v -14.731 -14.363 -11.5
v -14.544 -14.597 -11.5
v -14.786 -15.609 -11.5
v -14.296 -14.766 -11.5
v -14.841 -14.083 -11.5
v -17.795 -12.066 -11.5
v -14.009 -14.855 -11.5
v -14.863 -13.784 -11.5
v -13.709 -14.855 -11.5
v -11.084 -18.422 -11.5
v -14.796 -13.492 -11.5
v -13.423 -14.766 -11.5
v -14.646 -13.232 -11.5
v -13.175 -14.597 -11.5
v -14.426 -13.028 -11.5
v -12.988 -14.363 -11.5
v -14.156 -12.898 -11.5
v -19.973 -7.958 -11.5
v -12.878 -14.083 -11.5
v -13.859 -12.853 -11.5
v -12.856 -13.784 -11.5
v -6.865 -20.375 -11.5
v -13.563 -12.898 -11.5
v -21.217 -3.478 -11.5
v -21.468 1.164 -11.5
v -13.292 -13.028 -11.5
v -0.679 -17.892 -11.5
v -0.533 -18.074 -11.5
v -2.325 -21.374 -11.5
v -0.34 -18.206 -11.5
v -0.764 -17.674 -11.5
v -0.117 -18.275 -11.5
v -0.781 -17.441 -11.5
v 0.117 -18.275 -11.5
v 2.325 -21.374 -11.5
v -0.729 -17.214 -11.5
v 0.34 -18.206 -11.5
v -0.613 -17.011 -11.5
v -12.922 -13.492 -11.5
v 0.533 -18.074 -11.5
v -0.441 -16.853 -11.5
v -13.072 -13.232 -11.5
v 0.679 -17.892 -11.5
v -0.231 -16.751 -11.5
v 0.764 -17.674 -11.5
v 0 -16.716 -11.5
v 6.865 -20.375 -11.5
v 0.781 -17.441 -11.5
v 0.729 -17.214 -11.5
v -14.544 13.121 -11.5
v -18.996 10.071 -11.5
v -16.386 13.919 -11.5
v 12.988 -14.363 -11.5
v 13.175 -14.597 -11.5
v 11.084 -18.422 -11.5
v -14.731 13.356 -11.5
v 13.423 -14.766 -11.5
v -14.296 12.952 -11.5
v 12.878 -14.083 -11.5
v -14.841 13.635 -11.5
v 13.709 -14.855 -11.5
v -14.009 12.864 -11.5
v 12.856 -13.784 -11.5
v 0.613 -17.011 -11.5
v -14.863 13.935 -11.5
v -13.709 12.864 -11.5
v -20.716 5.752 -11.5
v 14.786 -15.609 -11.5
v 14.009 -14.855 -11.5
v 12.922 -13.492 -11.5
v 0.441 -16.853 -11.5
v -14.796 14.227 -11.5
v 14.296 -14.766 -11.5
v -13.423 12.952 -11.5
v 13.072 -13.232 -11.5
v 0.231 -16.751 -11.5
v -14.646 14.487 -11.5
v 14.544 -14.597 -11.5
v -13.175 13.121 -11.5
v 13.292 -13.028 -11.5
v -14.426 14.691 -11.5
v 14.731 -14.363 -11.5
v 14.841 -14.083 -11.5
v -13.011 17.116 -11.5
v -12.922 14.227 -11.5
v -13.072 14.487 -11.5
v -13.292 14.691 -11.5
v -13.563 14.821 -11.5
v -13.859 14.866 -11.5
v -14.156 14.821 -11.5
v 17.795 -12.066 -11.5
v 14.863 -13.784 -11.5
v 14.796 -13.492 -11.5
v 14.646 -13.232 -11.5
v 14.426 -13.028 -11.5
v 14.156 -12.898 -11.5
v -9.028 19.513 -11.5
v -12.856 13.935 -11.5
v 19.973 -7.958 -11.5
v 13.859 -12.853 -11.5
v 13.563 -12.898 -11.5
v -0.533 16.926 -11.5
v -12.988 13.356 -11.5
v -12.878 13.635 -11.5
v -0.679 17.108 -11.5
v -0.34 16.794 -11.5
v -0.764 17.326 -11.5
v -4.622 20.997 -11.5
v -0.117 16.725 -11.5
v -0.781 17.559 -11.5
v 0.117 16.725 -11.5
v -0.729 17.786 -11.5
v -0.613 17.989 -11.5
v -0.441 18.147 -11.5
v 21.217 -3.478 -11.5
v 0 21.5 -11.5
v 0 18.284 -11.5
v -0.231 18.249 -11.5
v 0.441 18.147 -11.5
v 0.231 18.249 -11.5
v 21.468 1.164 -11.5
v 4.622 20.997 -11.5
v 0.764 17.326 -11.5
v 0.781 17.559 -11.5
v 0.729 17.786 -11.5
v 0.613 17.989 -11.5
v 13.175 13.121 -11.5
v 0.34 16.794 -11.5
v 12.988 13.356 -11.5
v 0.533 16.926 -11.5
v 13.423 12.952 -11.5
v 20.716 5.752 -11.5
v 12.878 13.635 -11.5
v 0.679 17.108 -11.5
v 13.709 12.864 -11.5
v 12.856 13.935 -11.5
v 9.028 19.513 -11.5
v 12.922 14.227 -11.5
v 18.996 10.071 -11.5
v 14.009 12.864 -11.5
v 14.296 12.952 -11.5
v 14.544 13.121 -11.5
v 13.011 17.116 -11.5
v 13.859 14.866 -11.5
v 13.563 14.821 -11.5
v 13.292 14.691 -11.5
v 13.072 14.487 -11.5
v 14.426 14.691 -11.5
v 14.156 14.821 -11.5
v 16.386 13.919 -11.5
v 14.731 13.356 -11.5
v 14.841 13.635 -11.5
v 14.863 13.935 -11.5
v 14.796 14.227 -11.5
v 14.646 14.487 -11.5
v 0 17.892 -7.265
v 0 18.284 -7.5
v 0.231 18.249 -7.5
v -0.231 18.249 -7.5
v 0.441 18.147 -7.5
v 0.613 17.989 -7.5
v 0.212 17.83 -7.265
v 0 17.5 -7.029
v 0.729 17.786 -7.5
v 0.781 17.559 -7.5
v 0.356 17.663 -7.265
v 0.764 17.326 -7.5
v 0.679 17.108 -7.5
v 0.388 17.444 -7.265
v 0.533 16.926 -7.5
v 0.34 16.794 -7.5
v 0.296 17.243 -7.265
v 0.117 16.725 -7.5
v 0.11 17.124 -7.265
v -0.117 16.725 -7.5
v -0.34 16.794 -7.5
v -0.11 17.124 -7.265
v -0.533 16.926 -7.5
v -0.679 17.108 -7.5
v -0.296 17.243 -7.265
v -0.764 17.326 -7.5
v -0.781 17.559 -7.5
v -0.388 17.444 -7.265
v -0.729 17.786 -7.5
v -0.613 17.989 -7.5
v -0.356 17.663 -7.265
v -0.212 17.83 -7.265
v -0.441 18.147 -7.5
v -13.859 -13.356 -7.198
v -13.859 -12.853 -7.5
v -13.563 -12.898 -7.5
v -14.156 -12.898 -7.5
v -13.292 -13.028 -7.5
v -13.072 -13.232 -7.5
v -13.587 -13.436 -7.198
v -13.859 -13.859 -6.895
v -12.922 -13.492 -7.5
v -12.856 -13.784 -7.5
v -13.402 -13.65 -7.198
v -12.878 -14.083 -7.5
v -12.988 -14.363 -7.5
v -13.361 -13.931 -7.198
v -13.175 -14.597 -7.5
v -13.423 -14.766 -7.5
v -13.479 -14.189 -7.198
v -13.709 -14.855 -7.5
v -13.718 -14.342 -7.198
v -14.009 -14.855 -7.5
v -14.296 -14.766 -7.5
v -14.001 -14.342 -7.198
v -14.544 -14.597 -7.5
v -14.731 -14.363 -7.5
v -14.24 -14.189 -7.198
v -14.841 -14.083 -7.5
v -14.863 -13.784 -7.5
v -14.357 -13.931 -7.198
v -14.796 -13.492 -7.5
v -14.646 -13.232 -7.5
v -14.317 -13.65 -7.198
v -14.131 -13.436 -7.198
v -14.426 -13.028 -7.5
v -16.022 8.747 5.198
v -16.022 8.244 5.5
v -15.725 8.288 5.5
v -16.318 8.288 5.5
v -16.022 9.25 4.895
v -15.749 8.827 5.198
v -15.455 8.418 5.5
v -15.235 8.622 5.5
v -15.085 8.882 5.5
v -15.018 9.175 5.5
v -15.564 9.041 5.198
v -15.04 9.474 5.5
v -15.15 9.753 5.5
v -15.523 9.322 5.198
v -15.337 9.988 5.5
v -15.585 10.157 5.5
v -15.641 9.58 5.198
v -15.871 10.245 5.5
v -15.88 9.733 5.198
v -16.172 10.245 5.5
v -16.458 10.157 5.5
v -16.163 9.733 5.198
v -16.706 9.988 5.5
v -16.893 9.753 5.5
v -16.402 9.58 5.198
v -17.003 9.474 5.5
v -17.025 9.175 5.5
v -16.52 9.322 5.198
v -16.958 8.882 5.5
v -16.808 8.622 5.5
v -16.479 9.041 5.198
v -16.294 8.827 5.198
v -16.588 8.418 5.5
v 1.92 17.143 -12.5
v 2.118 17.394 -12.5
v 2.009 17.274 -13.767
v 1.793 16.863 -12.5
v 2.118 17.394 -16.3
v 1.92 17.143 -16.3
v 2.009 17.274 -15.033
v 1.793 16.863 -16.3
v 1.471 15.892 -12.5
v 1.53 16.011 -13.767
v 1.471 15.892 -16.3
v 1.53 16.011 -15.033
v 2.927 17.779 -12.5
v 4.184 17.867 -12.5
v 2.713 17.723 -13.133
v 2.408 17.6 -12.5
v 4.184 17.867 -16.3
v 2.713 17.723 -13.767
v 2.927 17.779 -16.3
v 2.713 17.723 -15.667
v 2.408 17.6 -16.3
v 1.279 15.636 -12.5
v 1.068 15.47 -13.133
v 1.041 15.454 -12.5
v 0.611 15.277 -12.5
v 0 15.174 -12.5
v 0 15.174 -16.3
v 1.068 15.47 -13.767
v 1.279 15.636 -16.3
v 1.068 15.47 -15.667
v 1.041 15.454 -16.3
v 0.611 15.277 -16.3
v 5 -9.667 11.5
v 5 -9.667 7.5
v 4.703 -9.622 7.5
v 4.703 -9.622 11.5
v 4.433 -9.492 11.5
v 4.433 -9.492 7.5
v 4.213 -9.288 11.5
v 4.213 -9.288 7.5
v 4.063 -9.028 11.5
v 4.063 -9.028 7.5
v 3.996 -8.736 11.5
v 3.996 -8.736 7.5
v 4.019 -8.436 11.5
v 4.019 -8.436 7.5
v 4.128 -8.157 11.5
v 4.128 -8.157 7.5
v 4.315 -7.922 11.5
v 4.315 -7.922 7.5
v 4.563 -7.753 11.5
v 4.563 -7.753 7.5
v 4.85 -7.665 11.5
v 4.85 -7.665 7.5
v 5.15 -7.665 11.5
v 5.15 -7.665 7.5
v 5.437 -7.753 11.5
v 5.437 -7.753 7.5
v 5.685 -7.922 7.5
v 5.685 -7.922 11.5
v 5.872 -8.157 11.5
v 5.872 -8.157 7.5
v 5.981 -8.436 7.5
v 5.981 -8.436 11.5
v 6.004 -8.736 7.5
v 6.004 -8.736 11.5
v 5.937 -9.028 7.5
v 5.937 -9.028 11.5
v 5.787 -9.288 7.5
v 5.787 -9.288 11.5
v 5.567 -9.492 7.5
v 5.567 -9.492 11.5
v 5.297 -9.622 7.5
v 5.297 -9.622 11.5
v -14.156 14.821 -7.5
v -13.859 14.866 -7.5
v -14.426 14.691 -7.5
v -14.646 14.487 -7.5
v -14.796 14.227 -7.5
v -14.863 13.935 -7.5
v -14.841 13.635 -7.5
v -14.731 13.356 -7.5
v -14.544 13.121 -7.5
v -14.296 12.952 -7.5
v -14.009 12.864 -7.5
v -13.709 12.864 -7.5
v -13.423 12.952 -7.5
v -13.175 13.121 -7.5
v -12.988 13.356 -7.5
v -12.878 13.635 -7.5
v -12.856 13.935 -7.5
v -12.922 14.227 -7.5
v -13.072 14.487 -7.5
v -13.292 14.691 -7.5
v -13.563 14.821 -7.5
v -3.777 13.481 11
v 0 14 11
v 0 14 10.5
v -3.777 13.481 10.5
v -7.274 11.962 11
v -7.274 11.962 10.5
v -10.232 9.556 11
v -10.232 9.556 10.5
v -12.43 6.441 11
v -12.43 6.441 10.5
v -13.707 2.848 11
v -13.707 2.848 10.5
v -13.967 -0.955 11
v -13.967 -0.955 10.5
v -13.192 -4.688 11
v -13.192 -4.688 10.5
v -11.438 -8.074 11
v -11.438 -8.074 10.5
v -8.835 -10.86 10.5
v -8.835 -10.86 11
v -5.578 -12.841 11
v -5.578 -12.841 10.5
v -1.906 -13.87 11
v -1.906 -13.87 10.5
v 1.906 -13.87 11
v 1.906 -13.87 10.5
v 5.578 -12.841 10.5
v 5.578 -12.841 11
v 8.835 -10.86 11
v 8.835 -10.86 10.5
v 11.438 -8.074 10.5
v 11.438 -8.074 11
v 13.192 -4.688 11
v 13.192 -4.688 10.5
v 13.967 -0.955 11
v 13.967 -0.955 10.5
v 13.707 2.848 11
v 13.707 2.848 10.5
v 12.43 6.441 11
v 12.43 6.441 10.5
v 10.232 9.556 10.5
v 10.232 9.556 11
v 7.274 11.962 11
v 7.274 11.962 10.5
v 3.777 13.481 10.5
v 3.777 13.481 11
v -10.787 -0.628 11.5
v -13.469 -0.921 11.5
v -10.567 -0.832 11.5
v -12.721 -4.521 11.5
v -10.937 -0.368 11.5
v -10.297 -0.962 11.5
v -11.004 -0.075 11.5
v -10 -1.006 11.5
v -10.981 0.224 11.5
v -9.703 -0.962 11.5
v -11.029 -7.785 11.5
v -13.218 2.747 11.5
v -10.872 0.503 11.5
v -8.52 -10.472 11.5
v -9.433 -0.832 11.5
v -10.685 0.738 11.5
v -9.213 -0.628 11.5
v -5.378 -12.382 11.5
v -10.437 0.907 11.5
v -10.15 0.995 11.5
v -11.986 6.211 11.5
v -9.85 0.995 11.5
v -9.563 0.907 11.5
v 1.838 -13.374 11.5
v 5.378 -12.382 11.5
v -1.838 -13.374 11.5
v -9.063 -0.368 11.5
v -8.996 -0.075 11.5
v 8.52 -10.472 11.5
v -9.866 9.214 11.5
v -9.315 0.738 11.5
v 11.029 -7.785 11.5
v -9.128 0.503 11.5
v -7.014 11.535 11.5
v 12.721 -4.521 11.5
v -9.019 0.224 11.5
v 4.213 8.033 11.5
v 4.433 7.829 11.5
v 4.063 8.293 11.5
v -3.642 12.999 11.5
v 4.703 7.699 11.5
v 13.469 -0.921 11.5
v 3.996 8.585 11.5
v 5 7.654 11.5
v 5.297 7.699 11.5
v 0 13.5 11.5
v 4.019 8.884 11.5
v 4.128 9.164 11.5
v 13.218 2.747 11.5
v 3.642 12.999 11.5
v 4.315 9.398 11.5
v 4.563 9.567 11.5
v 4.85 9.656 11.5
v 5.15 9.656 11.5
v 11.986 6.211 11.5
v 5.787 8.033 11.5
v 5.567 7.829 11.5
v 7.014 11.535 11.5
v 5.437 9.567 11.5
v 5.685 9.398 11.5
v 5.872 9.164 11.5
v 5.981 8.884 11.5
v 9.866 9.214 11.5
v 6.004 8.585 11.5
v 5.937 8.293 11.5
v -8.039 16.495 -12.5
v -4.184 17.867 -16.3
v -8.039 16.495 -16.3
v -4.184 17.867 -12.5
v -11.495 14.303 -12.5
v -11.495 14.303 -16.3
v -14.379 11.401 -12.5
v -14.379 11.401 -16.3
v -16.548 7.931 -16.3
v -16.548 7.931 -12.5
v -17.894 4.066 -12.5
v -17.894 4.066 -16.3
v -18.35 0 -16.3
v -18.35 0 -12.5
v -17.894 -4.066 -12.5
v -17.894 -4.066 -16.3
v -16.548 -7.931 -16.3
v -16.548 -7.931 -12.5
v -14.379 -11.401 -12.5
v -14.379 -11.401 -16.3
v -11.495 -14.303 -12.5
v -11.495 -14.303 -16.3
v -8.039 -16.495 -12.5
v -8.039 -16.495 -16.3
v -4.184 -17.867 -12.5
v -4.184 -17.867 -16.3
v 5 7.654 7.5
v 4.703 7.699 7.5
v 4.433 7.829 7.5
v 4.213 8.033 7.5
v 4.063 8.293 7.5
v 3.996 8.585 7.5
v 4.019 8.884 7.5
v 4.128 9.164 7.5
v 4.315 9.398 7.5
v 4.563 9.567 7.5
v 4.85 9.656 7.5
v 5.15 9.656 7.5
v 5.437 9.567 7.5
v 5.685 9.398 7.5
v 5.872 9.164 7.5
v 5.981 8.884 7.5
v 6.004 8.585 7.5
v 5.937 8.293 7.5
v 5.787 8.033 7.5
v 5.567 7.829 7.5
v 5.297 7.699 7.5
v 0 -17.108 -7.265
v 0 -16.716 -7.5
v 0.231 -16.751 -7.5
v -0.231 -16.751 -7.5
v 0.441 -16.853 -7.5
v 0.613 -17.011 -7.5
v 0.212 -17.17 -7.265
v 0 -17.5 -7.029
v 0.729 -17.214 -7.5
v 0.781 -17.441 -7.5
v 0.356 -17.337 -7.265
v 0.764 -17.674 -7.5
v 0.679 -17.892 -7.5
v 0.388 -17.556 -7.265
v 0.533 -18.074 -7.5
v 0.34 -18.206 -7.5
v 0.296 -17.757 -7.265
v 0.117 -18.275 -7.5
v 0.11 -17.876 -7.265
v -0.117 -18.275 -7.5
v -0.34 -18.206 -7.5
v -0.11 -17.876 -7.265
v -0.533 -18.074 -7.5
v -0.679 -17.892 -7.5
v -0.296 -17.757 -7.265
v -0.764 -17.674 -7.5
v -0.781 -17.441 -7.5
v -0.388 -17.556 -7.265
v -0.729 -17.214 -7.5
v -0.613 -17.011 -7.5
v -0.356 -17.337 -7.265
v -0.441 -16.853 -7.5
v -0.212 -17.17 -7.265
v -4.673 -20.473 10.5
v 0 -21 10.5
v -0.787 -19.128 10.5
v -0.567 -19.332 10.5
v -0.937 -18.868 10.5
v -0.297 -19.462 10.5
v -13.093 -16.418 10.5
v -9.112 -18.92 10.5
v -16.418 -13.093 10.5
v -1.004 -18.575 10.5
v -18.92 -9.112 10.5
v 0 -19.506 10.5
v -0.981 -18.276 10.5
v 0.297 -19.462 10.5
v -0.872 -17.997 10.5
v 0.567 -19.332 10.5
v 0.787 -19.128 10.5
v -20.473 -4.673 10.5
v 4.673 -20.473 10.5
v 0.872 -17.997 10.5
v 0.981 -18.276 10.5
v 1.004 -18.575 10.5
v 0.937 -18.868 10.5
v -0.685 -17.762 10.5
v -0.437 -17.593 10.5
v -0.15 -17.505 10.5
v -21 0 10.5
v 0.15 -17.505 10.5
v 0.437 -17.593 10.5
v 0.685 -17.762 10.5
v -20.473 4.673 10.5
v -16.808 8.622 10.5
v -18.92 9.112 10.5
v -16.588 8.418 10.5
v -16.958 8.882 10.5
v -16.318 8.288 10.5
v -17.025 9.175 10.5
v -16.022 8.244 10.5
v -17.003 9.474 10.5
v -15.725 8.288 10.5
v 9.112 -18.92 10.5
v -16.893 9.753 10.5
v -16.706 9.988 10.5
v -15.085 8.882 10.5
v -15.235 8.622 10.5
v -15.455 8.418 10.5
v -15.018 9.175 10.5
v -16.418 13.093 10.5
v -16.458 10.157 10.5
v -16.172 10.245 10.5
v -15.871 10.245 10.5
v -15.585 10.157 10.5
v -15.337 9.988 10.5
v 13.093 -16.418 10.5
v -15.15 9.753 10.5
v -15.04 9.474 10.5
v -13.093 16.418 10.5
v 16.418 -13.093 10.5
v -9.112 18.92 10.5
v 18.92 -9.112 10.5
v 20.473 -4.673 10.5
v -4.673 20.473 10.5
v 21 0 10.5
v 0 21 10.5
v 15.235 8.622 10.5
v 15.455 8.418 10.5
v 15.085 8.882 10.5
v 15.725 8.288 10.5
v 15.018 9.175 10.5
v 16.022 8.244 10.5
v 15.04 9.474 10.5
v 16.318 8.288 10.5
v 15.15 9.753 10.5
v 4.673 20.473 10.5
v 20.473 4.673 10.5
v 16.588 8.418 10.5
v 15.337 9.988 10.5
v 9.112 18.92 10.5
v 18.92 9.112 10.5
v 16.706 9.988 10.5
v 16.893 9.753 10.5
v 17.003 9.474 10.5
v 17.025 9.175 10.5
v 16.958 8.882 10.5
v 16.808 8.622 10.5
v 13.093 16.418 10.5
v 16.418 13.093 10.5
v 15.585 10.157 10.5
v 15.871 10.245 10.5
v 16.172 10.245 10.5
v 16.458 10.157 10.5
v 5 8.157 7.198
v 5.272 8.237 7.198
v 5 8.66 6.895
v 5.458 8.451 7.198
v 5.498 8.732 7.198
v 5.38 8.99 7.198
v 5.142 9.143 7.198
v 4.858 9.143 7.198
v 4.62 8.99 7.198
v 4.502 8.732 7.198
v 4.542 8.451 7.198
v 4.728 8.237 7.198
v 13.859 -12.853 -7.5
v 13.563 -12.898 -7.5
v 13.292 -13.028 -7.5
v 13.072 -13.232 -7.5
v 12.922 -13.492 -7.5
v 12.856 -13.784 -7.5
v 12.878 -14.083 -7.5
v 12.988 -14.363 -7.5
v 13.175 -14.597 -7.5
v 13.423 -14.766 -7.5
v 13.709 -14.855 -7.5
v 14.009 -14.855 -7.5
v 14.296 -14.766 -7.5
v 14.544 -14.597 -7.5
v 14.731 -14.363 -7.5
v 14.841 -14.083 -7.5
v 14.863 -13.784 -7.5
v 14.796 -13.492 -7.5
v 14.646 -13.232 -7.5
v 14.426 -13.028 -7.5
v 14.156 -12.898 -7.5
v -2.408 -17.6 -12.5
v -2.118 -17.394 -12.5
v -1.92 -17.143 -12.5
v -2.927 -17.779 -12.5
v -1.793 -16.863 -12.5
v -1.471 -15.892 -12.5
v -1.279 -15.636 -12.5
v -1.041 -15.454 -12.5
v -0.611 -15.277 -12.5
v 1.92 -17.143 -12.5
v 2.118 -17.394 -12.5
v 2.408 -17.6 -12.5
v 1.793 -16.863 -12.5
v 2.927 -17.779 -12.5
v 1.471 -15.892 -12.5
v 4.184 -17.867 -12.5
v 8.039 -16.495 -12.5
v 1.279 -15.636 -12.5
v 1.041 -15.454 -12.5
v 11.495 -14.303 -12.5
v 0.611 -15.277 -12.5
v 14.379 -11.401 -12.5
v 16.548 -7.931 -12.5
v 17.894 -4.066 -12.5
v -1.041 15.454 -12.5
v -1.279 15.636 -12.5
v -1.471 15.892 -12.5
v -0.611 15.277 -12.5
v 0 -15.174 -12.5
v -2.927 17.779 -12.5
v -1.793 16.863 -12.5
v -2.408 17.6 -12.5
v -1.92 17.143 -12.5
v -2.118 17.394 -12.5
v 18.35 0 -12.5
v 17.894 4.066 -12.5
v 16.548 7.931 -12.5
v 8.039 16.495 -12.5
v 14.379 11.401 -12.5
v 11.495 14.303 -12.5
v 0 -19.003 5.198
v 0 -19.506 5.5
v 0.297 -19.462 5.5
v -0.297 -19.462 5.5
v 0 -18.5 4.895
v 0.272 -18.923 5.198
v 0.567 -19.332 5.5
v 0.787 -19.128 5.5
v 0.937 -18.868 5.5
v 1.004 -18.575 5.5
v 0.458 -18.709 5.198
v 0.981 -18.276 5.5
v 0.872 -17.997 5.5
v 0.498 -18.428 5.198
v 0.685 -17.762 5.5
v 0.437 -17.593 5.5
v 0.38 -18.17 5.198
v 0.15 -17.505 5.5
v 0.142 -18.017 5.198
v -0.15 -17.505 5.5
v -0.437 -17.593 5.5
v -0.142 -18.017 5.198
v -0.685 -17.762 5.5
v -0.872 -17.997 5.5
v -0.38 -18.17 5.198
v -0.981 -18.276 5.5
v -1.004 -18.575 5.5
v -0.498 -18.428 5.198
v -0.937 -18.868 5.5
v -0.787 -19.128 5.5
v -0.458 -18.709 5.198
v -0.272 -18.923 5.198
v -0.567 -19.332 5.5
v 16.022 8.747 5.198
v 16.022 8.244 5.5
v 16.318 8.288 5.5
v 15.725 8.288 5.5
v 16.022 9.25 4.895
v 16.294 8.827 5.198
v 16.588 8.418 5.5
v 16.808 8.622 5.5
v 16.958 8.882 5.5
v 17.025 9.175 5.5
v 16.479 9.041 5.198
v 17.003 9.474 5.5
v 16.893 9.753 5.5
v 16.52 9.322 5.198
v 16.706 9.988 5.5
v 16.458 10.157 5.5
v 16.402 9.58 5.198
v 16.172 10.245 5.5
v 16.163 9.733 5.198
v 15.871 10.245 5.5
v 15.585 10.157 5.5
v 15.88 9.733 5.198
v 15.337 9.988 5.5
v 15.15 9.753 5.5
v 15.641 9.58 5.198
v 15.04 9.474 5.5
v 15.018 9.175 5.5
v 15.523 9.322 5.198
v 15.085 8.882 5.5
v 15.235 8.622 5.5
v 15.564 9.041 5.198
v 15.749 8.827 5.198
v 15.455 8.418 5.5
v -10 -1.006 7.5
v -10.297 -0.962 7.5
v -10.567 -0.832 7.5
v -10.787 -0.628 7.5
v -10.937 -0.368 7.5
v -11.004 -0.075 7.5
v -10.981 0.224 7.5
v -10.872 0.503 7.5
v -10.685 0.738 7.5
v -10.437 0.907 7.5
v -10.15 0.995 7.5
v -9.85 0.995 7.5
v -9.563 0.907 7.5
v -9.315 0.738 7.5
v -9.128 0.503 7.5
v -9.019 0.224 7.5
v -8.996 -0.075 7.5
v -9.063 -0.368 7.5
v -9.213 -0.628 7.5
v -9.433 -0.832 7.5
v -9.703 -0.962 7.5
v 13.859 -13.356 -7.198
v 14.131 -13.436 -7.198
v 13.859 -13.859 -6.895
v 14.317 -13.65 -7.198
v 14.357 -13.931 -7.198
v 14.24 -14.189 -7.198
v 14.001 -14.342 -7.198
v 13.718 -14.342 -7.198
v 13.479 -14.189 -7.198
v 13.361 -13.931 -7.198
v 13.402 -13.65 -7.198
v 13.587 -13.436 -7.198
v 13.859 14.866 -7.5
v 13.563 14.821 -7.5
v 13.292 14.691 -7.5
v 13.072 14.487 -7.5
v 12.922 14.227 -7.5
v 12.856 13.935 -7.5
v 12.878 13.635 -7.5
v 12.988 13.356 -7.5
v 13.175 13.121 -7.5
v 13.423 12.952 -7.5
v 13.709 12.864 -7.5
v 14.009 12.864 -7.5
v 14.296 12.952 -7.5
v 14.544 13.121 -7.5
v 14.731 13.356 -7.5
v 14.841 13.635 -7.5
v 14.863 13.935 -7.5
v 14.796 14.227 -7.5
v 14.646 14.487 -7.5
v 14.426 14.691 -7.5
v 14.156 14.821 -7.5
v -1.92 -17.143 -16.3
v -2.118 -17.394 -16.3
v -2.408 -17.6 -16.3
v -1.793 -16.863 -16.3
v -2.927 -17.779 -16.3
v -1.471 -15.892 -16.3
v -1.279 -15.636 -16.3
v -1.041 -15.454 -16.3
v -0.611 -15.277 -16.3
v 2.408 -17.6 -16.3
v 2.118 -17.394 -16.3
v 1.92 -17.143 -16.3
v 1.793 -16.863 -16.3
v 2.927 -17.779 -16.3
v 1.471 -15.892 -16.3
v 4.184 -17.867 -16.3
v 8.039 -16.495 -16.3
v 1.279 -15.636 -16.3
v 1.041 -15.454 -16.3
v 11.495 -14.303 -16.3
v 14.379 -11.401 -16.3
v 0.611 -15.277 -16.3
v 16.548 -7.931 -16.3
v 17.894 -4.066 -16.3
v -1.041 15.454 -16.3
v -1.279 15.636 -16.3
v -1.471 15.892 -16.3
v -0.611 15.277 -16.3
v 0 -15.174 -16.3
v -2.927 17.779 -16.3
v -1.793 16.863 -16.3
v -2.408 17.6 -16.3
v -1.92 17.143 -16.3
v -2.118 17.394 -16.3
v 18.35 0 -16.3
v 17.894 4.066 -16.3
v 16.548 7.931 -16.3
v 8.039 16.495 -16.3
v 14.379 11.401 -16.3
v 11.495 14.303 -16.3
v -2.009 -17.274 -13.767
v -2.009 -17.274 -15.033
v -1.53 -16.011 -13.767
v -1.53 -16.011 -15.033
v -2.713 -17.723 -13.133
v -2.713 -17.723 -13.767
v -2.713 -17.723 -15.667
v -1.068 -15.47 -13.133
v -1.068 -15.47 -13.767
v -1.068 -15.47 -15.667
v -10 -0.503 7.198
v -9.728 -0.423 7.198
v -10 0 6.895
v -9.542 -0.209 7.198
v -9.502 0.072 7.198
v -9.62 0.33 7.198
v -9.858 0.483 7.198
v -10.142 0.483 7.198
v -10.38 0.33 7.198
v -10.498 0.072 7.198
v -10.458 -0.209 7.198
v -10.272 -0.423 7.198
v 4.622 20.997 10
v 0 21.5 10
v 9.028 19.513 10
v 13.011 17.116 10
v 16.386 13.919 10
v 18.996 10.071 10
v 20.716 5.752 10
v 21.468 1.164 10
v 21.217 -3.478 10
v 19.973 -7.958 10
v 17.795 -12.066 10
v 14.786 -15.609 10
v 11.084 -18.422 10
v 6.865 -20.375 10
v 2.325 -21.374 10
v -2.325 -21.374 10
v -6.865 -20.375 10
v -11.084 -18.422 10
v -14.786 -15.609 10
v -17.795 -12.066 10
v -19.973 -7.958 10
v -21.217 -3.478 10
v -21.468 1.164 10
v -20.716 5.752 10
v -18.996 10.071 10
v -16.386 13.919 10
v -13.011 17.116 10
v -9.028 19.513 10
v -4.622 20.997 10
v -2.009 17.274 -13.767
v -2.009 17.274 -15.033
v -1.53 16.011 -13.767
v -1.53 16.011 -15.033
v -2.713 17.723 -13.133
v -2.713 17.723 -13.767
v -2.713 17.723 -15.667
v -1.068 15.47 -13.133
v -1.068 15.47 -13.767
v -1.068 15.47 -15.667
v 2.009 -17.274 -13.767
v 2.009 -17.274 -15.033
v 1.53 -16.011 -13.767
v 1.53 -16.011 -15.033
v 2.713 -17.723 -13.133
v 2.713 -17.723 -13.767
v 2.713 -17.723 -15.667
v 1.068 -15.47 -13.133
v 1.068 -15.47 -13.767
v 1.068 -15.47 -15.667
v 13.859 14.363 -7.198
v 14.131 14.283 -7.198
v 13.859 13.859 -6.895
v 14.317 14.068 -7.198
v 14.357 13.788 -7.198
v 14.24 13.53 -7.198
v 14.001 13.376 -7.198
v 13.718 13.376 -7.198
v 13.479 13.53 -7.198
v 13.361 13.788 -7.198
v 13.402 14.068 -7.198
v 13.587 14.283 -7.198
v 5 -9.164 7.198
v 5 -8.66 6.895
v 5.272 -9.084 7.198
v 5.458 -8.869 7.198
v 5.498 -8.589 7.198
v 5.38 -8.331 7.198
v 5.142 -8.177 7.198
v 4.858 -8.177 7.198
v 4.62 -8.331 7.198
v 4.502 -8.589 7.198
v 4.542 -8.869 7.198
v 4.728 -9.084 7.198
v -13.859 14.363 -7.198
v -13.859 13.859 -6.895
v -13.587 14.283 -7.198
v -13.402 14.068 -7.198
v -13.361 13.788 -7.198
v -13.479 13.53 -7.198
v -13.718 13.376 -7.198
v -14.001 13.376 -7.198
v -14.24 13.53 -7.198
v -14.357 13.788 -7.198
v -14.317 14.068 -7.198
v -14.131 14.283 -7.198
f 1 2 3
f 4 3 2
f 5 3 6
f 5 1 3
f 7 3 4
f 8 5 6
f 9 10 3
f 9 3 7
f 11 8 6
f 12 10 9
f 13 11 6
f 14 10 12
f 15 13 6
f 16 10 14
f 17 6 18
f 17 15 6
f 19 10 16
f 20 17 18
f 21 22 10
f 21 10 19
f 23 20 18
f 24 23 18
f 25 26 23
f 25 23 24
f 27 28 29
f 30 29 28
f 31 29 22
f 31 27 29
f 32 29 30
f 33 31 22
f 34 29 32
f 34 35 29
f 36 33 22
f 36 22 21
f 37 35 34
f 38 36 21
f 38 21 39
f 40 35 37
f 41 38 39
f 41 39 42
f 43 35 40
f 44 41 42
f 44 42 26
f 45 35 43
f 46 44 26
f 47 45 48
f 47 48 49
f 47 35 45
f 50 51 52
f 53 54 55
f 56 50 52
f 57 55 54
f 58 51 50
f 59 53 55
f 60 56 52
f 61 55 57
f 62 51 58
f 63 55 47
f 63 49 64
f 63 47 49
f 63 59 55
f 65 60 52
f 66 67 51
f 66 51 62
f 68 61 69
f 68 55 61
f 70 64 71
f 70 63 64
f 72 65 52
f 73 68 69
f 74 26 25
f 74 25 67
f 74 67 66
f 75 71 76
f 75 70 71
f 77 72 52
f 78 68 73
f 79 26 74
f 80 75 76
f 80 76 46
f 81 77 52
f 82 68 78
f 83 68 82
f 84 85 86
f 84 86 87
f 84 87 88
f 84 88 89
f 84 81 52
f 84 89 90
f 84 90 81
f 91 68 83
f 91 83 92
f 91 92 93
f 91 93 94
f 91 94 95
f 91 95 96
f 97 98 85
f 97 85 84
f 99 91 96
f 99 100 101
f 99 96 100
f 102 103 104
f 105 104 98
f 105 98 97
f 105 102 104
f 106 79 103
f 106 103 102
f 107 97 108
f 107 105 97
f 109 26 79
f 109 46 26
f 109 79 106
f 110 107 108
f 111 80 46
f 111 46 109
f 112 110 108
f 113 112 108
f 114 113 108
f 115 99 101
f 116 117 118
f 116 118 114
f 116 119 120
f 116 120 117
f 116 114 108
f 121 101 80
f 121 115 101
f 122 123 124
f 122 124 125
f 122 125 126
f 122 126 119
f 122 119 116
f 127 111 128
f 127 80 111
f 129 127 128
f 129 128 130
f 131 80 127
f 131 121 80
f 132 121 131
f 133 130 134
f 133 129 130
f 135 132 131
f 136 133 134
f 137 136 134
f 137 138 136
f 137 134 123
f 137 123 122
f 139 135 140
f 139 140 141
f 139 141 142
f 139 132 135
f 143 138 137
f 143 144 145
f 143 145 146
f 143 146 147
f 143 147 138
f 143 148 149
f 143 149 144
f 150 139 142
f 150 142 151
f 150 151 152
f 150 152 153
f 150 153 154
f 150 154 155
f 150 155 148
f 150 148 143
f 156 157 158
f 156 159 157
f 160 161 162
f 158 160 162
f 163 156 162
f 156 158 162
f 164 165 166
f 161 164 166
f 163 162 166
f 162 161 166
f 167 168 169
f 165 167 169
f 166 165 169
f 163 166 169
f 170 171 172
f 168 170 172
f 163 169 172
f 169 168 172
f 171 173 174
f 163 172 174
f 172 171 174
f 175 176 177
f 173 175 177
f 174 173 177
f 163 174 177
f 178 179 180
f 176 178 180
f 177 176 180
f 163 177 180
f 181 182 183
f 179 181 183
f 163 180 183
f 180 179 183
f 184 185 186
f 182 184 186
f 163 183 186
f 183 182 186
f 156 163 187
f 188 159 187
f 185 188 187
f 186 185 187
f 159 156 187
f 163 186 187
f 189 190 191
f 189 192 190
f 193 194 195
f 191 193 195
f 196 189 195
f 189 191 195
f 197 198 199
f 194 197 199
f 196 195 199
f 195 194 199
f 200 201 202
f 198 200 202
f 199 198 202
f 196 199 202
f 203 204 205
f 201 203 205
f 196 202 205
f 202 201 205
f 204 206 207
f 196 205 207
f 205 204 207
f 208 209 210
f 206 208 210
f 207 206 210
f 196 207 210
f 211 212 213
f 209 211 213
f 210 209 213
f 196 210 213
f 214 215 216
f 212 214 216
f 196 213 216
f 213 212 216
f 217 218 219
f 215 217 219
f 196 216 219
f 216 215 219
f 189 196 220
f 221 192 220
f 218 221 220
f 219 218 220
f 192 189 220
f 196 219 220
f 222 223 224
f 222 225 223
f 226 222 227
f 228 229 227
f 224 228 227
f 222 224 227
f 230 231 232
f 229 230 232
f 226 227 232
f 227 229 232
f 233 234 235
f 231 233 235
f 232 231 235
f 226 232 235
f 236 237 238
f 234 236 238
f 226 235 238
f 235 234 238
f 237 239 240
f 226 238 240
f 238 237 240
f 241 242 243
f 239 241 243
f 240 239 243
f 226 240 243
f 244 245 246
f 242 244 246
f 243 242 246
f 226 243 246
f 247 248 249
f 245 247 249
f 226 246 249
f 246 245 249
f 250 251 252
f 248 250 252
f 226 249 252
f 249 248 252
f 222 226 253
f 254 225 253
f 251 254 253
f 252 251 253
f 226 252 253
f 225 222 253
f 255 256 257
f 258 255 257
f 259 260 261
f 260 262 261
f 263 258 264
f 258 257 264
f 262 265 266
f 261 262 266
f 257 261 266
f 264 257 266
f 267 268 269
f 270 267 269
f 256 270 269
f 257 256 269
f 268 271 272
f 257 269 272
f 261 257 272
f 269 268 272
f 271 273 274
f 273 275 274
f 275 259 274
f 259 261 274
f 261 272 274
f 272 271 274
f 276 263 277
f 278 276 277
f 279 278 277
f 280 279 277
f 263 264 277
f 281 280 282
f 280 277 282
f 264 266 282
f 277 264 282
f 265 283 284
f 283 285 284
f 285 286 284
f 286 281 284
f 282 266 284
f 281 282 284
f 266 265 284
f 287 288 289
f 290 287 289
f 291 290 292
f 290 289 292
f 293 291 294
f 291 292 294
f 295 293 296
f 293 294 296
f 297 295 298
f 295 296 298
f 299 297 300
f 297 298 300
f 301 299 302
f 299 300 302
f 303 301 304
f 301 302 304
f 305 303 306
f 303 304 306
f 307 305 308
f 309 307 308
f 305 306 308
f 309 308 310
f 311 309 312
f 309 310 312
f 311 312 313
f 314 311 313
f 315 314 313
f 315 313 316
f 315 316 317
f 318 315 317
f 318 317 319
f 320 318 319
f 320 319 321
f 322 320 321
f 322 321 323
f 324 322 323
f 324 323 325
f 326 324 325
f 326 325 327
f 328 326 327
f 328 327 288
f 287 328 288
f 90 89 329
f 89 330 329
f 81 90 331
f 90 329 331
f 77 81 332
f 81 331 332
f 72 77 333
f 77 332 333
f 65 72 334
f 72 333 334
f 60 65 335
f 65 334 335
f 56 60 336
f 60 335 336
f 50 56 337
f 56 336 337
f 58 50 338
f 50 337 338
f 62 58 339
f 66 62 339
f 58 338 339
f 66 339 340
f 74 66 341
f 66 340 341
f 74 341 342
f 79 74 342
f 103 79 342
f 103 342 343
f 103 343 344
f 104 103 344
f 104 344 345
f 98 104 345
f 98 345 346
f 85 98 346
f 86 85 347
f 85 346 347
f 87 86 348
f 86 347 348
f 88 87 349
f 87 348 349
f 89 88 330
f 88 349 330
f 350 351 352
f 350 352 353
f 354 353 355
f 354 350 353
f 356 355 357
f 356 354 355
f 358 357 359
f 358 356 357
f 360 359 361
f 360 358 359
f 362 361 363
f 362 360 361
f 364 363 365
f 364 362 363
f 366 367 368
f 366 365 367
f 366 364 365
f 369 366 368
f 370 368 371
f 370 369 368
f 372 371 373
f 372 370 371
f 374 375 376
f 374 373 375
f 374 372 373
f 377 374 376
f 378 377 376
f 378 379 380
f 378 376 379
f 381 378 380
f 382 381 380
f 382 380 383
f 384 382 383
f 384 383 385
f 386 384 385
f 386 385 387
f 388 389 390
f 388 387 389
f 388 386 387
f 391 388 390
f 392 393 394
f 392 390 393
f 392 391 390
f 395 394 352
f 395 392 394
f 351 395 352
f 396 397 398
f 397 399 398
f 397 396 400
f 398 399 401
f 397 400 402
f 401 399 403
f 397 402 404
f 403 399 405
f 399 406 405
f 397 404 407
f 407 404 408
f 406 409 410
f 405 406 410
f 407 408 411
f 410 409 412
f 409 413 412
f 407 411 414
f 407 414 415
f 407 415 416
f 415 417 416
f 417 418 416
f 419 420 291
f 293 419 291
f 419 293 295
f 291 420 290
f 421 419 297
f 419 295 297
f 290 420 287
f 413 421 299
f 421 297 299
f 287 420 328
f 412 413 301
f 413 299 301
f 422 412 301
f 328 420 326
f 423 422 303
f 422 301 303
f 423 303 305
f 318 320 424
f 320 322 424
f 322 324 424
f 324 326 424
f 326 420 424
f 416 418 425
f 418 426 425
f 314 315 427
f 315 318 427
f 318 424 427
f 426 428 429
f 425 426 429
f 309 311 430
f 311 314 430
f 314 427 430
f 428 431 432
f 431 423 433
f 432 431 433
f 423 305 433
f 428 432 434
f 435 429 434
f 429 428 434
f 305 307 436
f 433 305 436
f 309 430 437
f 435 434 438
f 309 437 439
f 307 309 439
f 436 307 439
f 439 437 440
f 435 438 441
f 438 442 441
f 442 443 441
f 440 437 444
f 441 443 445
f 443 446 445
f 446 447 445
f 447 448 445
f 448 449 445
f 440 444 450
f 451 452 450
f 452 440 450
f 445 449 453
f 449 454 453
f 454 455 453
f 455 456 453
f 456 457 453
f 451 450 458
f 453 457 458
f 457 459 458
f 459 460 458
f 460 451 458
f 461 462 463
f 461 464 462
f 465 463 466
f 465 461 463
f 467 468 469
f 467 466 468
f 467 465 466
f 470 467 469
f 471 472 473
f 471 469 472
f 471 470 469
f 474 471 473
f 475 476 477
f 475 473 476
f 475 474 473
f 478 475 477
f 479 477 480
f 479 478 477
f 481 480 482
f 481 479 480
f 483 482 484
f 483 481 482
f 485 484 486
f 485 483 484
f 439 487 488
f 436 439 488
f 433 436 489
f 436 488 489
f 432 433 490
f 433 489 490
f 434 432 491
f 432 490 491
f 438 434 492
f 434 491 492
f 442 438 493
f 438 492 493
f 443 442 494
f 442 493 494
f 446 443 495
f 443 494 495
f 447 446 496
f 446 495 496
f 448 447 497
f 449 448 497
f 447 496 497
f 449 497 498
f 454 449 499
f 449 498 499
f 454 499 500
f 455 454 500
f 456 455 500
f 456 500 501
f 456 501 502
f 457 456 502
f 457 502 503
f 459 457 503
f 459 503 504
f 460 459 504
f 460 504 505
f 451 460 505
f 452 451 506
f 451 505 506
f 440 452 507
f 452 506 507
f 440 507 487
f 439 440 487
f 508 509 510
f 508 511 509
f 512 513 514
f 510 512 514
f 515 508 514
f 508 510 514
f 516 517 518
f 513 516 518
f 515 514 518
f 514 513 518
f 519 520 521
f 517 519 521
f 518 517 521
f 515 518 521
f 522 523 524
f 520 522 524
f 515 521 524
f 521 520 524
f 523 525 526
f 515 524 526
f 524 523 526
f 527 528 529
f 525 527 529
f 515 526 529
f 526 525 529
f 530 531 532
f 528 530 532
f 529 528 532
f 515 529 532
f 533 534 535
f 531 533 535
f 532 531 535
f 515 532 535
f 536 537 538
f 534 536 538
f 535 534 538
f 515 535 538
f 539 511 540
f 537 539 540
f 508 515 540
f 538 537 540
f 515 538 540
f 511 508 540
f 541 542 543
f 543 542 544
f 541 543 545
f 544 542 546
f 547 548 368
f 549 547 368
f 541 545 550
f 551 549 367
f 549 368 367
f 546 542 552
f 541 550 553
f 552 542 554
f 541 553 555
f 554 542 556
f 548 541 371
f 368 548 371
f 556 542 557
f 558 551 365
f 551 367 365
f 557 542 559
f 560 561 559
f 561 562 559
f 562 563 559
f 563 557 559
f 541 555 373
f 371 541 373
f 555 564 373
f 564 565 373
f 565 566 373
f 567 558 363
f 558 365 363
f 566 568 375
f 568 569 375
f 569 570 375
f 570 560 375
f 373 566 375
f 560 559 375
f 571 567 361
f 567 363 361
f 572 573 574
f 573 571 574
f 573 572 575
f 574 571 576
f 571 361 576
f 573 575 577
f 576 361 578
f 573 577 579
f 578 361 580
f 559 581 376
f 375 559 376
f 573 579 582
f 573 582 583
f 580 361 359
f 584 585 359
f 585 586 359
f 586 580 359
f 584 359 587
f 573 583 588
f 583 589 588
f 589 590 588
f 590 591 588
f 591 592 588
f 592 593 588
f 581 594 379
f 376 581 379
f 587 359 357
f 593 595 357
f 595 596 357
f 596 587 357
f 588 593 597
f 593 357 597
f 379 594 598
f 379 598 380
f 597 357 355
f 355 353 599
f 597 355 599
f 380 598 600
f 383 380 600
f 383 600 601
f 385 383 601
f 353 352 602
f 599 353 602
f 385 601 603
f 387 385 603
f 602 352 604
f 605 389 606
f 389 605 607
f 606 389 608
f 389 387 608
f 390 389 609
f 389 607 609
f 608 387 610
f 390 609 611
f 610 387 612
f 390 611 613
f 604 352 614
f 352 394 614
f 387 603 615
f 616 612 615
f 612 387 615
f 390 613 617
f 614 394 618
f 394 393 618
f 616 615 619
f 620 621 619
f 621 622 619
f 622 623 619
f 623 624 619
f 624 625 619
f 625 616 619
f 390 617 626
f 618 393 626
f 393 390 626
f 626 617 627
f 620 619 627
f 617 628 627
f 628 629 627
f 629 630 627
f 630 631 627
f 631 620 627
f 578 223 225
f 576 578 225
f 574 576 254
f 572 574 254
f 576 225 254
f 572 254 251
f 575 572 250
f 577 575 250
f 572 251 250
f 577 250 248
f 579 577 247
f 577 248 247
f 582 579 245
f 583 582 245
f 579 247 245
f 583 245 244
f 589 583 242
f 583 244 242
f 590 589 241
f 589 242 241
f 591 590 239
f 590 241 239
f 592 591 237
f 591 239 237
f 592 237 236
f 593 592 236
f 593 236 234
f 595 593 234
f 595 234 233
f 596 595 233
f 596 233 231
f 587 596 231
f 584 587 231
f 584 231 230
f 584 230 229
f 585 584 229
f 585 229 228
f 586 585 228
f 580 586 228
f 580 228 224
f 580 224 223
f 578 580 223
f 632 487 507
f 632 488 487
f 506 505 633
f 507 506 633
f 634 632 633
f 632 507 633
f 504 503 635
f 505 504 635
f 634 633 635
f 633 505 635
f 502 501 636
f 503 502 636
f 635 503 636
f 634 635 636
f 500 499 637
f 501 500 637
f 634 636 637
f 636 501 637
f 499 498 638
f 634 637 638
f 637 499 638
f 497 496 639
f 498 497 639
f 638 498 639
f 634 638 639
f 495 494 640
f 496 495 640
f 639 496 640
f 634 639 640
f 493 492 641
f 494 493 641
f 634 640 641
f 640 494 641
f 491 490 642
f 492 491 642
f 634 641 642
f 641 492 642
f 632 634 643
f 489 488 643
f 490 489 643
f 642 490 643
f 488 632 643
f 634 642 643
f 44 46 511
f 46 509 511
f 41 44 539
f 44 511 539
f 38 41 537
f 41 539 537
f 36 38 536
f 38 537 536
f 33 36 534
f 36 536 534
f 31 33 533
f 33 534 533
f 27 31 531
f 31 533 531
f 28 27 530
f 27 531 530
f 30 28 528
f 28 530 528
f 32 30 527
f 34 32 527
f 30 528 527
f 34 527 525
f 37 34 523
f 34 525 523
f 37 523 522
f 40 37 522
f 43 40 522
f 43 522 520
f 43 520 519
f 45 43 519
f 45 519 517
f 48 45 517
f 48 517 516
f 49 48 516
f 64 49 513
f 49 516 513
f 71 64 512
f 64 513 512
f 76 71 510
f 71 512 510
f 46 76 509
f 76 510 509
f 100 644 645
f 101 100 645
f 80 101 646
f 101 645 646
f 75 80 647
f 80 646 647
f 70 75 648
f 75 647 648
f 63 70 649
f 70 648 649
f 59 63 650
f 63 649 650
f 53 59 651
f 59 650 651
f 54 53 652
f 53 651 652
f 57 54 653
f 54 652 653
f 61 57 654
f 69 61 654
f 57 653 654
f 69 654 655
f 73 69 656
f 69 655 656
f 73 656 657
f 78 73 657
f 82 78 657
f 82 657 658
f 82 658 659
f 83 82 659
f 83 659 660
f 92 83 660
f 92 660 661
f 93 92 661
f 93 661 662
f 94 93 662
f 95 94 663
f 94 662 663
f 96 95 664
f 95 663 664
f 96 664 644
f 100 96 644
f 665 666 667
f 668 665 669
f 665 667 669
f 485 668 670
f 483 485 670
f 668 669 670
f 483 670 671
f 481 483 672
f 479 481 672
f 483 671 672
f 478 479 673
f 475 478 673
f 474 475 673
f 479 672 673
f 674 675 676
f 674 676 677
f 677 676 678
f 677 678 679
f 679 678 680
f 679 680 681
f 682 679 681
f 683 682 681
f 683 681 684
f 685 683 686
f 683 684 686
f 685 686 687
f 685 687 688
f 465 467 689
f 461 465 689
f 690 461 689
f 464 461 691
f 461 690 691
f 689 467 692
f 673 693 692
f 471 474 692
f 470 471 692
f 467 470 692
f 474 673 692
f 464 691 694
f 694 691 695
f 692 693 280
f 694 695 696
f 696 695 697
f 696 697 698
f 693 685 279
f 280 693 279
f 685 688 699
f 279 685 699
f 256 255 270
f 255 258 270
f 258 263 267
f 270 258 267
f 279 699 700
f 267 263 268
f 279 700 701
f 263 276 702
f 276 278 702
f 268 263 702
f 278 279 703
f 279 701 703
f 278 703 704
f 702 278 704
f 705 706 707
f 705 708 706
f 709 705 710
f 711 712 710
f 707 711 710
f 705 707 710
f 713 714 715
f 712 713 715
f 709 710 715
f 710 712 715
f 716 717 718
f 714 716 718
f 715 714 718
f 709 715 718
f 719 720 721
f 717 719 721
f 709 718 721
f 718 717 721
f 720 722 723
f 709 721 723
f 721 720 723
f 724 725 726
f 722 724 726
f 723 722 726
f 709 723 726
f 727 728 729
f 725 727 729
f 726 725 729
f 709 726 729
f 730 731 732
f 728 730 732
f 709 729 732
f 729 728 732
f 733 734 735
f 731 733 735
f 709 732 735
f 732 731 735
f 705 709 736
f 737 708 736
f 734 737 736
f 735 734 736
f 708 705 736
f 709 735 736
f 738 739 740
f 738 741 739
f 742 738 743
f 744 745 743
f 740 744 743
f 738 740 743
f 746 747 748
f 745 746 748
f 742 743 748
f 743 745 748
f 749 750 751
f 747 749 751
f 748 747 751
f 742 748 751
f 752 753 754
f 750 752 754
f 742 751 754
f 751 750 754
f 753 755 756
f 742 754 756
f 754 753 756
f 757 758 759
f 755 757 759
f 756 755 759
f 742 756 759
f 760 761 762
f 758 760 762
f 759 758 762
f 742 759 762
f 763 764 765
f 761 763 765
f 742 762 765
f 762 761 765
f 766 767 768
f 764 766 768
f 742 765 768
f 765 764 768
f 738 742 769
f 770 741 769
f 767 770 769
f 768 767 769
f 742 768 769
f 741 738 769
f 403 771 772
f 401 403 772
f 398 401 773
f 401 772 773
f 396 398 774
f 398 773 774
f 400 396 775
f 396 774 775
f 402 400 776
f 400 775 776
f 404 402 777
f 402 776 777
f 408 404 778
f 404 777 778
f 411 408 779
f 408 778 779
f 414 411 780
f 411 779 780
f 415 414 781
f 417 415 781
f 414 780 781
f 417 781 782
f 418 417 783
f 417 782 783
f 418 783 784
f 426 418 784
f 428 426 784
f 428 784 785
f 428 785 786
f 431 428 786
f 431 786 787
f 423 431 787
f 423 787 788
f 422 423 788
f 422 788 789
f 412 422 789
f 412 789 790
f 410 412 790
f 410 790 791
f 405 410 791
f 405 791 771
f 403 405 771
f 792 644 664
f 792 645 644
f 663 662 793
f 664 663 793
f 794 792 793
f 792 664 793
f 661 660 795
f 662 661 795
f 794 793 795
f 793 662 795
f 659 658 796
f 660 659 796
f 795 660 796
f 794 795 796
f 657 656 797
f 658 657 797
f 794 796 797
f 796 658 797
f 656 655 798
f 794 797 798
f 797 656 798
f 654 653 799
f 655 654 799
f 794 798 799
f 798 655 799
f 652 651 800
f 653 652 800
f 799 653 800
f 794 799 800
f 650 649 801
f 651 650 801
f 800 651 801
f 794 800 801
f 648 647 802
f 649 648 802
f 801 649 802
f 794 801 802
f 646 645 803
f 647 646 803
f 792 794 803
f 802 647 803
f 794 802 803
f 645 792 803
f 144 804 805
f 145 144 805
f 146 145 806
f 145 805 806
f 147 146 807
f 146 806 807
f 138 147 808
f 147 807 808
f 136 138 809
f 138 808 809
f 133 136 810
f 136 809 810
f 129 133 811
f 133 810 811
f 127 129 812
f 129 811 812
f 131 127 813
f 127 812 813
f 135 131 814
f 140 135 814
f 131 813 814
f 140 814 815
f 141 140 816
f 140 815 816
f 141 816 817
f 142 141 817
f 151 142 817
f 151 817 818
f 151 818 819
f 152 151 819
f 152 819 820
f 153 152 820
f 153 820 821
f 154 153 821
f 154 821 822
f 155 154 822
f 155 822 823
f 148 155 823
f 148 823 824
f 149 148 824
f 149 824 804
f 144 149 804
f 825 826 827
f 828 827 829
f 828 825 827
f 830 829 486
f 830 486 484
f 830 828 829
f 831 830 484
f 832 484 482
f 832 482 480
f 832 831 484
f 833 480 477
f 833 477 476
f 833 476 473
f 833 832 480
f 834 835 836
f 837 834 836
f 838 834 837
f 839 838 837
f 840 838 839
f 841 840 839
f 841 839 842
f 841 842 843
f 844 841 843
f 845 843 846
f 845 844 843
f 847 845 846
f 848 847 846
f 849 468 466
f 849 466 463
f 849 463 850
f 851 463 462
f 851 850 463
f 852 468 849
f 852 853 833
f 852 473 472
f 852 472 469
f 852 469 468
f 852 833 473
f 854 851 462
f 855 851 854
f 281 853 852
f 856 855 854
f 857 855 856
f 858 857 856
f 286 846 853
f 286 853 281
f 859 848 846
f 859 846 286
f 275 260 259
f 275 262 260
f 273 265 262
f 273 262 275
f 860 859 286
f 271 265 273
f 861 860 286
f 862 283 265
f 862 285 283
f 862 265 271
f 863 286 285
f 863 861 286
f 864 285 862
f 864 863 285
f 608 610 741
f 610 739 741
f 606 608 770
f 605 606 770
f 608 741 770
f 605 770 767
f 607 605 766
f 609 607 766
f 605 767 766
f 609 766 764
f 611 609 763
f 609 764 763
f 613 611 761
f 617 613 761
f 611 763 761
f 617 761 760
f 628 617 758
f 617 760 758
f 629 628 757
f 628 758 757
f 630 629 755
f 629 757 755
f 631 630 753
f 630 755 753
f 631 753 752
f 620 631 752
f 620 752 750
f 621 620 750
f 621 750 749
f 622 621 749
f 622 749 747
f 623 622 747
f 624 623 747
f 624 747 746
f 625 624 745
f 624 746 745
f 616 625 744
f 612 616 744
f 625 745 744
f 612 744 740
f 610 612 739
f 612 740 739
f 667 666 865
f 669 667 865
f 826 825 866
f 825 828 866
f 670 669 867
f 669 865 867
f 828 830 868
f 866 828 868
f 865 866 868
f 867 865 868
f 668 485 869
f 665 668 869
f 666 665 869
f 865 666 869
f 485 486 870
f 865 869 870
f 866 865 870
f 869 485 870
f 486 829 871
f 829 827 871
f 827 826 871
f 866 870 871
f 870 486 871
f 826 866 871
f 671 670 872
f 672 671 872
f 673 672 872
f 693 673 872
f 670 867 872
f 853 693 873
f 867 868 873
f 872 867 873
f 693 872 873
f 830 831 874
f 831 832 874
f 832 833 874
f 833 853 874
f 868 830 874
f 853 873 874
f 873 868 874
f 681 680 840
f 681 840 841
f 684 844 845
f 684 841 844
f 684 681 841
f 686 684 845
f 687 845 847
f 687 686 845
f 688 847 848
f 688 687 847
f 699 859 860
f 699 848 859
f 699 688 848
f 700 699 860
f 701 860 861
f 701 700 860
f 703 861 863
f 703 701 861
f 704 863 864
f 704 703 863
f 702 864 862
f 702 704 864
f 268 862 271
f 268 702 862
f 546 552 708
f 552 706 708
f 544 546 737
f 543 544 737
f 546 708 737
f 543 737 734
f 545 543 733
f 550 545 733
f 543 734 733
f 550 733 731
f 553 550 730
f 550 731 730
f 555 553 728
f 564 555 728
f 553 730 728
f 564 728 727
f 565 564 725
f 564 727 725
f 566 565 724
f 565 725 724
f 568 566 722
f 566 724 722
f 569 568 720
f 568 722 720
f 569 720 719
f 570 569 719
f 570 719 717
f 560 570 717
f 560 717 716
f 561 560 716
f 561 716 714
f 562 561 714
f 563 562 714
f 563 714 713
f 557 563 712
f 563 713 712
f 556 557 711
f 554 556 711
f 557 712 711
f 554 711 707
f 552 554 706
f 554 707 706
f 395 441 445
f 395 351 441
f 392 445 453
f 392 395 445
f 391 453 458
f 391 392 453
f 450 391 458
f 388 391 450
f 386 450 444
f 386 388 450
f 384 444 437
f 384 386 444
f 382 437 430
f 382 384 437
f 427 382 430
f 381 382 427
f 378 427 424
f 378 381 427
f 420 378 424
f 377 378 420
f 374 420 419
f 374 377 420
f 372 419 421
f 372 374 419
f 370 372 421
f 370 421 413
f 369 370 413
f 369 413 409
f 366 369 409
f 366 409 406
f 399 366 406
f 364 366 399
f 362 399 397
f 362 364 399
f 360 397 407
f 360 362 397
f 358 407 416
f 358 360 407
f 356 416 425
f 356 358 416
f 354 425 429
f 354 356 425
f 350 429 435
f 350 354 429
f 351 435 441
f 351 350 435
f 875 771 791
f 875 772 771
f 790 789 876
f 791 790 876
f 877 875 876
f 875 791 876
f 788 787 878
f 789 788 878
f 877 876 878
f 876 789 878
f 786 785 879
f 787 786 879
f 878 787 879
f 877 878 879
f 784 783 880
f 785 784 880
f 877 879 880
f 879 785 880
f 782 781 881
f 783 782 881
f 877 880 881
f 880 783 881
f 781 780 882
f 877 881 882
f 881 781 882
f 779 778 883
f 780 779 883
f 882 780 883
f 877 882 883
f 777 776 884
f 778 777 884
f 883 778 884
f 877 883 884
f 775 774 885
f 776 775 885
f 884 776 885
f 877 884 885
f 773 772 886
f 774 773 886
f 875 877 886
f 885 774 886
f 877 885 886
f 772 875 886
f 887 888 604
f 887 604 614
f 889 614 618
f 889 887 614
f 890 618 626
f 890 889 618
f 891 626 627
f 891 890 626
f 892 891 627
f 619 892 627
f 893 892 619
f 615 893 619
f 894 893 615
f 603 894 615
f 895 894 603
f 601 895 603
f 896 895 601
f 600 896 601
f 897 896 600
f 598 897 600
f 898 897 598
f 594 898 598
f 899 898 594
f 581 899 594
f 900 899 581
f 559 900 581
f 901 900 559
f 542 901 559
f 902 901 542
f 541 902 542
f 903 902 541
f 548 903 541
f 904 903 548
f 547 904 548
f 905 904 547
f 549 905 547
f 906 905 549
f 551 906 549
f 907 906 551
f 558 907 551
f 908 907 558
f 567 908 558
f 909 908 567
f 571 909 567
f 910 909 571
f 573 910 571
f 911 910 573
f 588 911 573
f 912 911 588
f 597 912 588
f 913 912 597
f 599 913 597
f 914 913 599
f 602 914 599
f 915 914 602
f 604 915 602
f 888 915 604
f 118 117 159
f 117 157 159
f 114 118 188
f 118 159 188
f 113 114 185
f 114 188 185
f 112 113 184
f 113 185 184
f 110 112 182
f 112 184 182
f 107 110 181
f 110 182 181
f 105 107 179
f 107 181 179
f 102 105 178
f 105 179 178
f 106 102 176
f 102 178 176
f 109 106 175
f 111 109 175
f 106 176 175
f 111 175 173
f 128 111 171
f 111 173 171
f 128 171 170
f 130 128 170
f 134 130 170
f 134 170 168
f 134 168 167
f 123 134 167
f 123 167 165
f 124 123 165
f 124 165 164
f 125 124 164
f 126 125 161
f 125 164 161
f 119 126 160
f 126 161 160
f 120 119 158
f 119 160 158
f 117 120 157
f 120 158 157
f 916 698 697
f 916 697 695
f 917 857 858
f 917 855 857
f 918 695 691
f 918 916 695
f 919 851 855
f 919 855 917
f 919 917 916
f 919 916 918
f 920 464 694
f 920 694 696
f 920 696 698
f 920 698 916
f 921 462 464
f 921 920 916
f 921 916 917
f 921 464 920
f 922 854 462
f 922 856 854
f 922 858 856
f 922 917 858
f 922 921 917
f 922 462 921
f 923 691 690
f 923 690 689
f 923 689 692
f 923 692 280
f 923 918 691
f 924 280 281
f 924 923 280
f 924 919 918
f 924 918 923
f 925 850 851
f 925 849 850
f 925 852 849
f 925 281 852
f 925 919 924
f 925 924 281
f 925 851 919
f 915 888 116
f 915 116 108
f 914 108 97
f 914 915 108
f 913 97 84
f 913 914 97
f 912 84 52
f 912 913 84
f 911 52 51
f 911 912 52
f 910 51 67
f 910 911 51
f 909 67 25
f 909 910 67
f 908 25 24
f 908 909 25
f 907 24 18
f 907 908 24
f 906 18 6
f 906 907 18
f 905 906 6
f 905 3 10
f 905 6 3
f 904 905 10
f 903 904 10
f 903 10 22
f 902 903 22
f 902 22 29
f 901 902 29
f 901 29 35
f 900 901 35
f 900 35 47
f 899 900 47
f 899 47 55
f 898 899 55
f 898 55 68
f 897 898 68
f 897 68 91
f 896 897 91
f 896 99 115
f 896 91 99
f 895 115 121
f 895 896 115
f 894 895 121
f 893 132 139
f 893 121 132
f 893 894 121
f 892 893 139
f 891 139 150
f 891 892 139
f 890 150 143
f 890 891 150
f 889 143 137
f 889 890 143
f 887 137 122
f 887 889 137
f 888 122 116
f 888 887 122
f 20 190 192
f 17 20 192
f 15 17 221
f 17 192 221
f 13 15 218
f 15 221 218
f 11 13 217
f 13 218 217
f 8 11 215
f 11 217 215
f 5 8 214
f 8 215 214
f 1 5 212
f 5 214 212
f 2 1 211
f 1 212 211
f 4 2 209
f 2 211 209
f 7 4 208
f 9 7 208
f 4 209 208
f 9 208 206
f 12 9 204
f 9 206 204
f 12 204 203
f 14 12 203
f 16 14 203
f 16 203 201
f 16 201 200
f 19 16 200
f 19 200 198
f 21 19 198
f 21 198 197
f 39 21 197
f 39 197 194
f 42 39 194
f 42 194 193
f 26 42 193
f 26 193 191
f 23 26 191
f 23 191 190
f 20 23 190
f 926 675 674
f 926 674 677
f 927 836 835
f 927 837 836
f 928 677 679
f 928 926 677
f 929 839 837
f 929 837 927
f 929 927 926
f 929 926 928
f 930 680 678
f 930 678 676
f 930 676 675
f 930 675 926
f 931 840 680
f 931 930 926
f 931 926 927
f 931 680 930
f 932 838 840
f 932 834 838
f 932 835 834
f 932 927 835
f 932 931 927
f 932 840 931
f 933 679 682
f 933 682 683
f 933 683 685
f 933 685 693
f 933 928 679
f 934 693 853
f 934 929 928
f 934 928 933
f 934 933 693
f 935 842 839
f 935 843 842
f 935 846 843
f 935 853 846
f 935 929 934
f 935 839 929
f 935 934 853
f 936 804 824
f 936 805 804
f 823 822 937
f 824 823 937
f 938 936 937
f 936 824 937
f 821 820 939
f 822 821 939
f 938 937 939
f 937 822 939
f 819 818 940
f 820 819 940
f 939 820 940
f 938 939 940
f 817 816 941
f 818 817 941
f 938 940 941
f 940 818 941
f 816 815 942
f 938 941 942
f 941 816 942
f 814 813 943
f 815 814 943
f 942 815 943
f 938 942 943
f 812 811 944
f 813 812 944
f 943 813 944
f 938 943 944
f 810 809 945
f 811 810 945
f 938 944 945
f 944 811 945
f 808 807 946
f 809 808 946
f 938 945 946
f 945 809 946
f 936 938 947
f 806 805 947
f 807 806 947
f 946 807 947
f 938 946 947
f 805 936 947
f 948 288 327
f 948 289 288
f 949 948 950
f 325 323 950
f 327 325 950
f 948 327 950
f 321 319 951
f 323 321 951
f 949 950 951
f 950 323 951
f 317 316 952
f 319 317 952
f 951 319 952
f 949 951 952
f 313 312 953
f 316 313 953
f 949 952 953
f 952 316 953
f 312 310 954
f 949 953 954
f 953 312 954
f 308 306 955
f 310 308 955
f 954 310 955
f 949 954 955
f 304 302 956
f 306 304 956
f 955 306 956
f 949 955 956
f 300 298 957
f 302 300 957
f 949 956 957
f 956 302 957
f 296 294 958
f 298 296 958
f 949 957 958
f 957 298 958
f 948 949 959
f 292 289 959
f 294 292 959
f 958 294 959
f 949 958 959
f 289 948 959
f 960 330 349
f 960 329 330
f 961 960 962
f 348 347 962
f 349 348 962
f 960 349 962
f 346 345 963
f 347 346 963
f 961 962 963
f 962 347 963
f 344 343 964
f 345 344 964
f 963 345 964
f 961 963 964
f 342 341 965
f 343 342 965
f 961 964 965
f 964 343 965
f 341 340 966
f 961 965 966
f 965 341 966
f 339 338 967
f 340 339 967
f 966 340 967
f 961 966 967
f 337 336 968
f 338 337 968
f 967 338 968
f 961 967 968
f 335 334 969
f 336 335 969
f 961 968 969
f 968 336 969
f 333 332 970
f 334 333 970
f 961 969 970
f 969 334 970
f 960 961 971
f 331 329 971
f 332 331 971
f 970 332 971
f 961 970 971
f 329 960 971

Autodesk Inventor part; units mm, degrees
ref_plane "YZ Plane" through (0, 0, 0) normal (1, 0, 0) x (0, 1, 0)
ref_plane "XZ Plane" through (0, 0, 0) normal (0, 1, 0) x (-1, 0, 0)
ref_plane "XY Plane" through (0, 0, 0) normal (0, 0, 1) x (1, 0, 0)
sketch "スケッチ1" plane through (0, 0, 0) normal (1, 0, 0) x (0, 1, 0)
  line L0 (0, 11.5) -> (0, -11.5)
  line L1 (0, -11.5) -> (21.5, -11.5)
  line L2 (21.5, -11.5) -> (21.5, 10)
  line L3 (21.5, 10) -> (21, 10.5)
  line L4 (21, 10.5) -> (14, 10.5)
  line L5 (14, 10.5) -> (14, 11)
  line L6 (14, 11) -> (13.5, 11.5)
  line L7 (13.5, 11.5) -> (0, 11.5)
  line L8 (0, 11.5) -> (0, -28.8949)
  line L9 (18.35, -12.5) -> (0, -12.5)
  line L10 (0, -12.5) -> (0, -16.3)
  line L11 (0, -16.3) -> (18.35, -16.3)
  line L12 (18.35, -16.3) -> (18.35, -12.5)
  point P0 (0, 0)
  point P1 (0, -12.5)
  dimension "d0" = 23
  dimension "d1" = 21.5
  dimension "d5" = 0.5
  dimension "d6" = 21
  dimension "d7" = 0.5
  dimension "d8" = 1
  dimension "d36" = 1
  dimension "d37" = 3.8
  dimension "d38" = 18.35
  dimension "d40" = 14
revolve "回転1" add sketch "スケッチ1" angle 360 about axis through (0, 0, 11.5) along (0, 0, -1)
sketch "スケッチ2" plane through (0, 0, 11.5) normal (0, 0, 1) x (1, 0, 0)
  circle A0 centre (0, 0) radius 13.5 projected
  point P0 (0, 0)
  point P1 (-10, 0)
  point P2 (5, -8.6603)
  point P3 (5, 8.6603)
  dimension "d10" = 10
  dimension "d11" = 0
  dimension "d14" = 360
hole "穴1" at (-10, 0, 11.5) at (5, -8.6603, 11.5) at (5, 8.6603, 11.5) direction (0, 0, -1) diameter 2.013 depth 4 tip angle 118 thread size "M2.5x0.45" designation "M2.5" class "6H" standard "GB Metric profile"
sketch "スケッチ3" plane through (0, 0, 10.5) normal (0, 0, 1) x (1, 0, 0)
  circle A0 centre (0, 0) radius 21 projected
  circle A1 centre (0, 0) radius 18.5
  point P0 (0, 0)
  point P1 (0, -18.5)
  point P2 (16.0215, 9.25)
  point P3 (-16.0215, 9.25)
  dimension "d23" = 37
  dimension "d24" = 0
  dimension "d27" = 360
hole "穴2" at (0, -18.5, 10.5) at (16.0215, 9.25, 10.5) at (-16.0215, 9.25, 10.5) direction (0, 0, -1) diameter 2.013 depth 5 tip angle 118 thread size "M2.5x0.45" designation "M2.5" class "6H" standard "GB Metric profile"
sketch "スケッチ4" plane through (0, 0, -11.5) normal (0, 0, -1) x (-1, 0, 0)
  circle A0 centre (0, 0) radius 19.6
  line L0 (0, 0) -> (0, -21.5)
  circle A1 centre (0, 0) radius 21.5 projected
  line L1 (0, 0) -> (-13.8593, -13.8593)
  point P0 (0, -17.5)
  point P1 (0, 17.5)
  point P2 (13.8593, -13.8593)
  point P3 (13.8593, 13.8593)
  point P4 (-13.8593, 13.8593)
  dimension "d45" = 39.2
  dimension "d41" = 35
  dimension "d42" = 0
  dimension "d43" = 0
  dimension "d44" = 17.5
  dimension "d46" = 45
  dimension "d49" = 360
hole "穴3" at (13.8593, -13.8593, -11.5) at (-13.8593, -13.8593, -11.5) at (-13.8593, 13.8593, -11.5) at (13.8593, 13.8593, -11.5) direction (0, 0, 1) diameter 2.013 depth 4 tip angle 118 thread size "M2.5x0.45" designation "M2.5" class "6H" standard "GB Metric profile"
hole "穴4" at (0, -17.5, -11.5) at (0, 17.5, -11.5) direction (0, 0, 1) diameter 1.567 depth 4 tip angle 118 thread size "M2x0.4" designation "M2" class "6H" standard "GB Metric profile"
sketch "スケッチ5" plane through (0, 0, -16.3) normal (0, 0, -1) x (-1, 0, 0)
  circle A0 centre (0, 0) radius 18.35 projected
  spline S0 degree 3 poles (4.1841, -17.8666) (0.2456, -17.9761) (2.9714, -15.4318) (0, -15.1735) knots 0 0 0 0 1 1 1 1
  line L0 (0, -15.1735) -> (0, -18.35)
  spline S1 degree 3 poles (-4.1841, -17.8666) (-0.2456, -17.9761) (-2.9714, -15.4318) (0, -15.1735) knots 0 0 0 0 1 1 1 1
  line L1 (0, 0) -> (-18.35, 0)
  spline S2 degree 3 poles (4.1841, 17.8666) (0.2456, 17.9761) (2.9714, 15.4318) (0, 15.1735) knots 0 0 0 0 1 1 1 1
  spline S3 degree 3 poles (-4.1841, 17.8666) (-0.2456, 17.9761) (-2.9714, 15.4318) (0, 15.1735) knots 0 0 0 0 1 1 1 1
  point P0 (0, 0)
  point P1 (1.867, -17.0431)
  point P2 (1.537, -16.0265)
  point P3 (-1.867, -17.0431)
  point P4 (-1.537, -16.0265)
  point P5 (1.867, 17.0431)
  point P6 (1.537, 16.0265)
  point P7 (-1.867, 17.0431)
  point P8 (-1.537, 16.0265)
  point P9 (-4.1841, 17.8666)
  point P10 (4.1841, 17.8666)
  point P11 (-4.1841, -17.8666)
extrude "押し出し1" cut sketch "スケッチ5" against normal blind 3.8 contours S2 S3 A0 | A0 L0 S0 | A0 S1 L0
properties part number "GIM3505-8_with-driver"
